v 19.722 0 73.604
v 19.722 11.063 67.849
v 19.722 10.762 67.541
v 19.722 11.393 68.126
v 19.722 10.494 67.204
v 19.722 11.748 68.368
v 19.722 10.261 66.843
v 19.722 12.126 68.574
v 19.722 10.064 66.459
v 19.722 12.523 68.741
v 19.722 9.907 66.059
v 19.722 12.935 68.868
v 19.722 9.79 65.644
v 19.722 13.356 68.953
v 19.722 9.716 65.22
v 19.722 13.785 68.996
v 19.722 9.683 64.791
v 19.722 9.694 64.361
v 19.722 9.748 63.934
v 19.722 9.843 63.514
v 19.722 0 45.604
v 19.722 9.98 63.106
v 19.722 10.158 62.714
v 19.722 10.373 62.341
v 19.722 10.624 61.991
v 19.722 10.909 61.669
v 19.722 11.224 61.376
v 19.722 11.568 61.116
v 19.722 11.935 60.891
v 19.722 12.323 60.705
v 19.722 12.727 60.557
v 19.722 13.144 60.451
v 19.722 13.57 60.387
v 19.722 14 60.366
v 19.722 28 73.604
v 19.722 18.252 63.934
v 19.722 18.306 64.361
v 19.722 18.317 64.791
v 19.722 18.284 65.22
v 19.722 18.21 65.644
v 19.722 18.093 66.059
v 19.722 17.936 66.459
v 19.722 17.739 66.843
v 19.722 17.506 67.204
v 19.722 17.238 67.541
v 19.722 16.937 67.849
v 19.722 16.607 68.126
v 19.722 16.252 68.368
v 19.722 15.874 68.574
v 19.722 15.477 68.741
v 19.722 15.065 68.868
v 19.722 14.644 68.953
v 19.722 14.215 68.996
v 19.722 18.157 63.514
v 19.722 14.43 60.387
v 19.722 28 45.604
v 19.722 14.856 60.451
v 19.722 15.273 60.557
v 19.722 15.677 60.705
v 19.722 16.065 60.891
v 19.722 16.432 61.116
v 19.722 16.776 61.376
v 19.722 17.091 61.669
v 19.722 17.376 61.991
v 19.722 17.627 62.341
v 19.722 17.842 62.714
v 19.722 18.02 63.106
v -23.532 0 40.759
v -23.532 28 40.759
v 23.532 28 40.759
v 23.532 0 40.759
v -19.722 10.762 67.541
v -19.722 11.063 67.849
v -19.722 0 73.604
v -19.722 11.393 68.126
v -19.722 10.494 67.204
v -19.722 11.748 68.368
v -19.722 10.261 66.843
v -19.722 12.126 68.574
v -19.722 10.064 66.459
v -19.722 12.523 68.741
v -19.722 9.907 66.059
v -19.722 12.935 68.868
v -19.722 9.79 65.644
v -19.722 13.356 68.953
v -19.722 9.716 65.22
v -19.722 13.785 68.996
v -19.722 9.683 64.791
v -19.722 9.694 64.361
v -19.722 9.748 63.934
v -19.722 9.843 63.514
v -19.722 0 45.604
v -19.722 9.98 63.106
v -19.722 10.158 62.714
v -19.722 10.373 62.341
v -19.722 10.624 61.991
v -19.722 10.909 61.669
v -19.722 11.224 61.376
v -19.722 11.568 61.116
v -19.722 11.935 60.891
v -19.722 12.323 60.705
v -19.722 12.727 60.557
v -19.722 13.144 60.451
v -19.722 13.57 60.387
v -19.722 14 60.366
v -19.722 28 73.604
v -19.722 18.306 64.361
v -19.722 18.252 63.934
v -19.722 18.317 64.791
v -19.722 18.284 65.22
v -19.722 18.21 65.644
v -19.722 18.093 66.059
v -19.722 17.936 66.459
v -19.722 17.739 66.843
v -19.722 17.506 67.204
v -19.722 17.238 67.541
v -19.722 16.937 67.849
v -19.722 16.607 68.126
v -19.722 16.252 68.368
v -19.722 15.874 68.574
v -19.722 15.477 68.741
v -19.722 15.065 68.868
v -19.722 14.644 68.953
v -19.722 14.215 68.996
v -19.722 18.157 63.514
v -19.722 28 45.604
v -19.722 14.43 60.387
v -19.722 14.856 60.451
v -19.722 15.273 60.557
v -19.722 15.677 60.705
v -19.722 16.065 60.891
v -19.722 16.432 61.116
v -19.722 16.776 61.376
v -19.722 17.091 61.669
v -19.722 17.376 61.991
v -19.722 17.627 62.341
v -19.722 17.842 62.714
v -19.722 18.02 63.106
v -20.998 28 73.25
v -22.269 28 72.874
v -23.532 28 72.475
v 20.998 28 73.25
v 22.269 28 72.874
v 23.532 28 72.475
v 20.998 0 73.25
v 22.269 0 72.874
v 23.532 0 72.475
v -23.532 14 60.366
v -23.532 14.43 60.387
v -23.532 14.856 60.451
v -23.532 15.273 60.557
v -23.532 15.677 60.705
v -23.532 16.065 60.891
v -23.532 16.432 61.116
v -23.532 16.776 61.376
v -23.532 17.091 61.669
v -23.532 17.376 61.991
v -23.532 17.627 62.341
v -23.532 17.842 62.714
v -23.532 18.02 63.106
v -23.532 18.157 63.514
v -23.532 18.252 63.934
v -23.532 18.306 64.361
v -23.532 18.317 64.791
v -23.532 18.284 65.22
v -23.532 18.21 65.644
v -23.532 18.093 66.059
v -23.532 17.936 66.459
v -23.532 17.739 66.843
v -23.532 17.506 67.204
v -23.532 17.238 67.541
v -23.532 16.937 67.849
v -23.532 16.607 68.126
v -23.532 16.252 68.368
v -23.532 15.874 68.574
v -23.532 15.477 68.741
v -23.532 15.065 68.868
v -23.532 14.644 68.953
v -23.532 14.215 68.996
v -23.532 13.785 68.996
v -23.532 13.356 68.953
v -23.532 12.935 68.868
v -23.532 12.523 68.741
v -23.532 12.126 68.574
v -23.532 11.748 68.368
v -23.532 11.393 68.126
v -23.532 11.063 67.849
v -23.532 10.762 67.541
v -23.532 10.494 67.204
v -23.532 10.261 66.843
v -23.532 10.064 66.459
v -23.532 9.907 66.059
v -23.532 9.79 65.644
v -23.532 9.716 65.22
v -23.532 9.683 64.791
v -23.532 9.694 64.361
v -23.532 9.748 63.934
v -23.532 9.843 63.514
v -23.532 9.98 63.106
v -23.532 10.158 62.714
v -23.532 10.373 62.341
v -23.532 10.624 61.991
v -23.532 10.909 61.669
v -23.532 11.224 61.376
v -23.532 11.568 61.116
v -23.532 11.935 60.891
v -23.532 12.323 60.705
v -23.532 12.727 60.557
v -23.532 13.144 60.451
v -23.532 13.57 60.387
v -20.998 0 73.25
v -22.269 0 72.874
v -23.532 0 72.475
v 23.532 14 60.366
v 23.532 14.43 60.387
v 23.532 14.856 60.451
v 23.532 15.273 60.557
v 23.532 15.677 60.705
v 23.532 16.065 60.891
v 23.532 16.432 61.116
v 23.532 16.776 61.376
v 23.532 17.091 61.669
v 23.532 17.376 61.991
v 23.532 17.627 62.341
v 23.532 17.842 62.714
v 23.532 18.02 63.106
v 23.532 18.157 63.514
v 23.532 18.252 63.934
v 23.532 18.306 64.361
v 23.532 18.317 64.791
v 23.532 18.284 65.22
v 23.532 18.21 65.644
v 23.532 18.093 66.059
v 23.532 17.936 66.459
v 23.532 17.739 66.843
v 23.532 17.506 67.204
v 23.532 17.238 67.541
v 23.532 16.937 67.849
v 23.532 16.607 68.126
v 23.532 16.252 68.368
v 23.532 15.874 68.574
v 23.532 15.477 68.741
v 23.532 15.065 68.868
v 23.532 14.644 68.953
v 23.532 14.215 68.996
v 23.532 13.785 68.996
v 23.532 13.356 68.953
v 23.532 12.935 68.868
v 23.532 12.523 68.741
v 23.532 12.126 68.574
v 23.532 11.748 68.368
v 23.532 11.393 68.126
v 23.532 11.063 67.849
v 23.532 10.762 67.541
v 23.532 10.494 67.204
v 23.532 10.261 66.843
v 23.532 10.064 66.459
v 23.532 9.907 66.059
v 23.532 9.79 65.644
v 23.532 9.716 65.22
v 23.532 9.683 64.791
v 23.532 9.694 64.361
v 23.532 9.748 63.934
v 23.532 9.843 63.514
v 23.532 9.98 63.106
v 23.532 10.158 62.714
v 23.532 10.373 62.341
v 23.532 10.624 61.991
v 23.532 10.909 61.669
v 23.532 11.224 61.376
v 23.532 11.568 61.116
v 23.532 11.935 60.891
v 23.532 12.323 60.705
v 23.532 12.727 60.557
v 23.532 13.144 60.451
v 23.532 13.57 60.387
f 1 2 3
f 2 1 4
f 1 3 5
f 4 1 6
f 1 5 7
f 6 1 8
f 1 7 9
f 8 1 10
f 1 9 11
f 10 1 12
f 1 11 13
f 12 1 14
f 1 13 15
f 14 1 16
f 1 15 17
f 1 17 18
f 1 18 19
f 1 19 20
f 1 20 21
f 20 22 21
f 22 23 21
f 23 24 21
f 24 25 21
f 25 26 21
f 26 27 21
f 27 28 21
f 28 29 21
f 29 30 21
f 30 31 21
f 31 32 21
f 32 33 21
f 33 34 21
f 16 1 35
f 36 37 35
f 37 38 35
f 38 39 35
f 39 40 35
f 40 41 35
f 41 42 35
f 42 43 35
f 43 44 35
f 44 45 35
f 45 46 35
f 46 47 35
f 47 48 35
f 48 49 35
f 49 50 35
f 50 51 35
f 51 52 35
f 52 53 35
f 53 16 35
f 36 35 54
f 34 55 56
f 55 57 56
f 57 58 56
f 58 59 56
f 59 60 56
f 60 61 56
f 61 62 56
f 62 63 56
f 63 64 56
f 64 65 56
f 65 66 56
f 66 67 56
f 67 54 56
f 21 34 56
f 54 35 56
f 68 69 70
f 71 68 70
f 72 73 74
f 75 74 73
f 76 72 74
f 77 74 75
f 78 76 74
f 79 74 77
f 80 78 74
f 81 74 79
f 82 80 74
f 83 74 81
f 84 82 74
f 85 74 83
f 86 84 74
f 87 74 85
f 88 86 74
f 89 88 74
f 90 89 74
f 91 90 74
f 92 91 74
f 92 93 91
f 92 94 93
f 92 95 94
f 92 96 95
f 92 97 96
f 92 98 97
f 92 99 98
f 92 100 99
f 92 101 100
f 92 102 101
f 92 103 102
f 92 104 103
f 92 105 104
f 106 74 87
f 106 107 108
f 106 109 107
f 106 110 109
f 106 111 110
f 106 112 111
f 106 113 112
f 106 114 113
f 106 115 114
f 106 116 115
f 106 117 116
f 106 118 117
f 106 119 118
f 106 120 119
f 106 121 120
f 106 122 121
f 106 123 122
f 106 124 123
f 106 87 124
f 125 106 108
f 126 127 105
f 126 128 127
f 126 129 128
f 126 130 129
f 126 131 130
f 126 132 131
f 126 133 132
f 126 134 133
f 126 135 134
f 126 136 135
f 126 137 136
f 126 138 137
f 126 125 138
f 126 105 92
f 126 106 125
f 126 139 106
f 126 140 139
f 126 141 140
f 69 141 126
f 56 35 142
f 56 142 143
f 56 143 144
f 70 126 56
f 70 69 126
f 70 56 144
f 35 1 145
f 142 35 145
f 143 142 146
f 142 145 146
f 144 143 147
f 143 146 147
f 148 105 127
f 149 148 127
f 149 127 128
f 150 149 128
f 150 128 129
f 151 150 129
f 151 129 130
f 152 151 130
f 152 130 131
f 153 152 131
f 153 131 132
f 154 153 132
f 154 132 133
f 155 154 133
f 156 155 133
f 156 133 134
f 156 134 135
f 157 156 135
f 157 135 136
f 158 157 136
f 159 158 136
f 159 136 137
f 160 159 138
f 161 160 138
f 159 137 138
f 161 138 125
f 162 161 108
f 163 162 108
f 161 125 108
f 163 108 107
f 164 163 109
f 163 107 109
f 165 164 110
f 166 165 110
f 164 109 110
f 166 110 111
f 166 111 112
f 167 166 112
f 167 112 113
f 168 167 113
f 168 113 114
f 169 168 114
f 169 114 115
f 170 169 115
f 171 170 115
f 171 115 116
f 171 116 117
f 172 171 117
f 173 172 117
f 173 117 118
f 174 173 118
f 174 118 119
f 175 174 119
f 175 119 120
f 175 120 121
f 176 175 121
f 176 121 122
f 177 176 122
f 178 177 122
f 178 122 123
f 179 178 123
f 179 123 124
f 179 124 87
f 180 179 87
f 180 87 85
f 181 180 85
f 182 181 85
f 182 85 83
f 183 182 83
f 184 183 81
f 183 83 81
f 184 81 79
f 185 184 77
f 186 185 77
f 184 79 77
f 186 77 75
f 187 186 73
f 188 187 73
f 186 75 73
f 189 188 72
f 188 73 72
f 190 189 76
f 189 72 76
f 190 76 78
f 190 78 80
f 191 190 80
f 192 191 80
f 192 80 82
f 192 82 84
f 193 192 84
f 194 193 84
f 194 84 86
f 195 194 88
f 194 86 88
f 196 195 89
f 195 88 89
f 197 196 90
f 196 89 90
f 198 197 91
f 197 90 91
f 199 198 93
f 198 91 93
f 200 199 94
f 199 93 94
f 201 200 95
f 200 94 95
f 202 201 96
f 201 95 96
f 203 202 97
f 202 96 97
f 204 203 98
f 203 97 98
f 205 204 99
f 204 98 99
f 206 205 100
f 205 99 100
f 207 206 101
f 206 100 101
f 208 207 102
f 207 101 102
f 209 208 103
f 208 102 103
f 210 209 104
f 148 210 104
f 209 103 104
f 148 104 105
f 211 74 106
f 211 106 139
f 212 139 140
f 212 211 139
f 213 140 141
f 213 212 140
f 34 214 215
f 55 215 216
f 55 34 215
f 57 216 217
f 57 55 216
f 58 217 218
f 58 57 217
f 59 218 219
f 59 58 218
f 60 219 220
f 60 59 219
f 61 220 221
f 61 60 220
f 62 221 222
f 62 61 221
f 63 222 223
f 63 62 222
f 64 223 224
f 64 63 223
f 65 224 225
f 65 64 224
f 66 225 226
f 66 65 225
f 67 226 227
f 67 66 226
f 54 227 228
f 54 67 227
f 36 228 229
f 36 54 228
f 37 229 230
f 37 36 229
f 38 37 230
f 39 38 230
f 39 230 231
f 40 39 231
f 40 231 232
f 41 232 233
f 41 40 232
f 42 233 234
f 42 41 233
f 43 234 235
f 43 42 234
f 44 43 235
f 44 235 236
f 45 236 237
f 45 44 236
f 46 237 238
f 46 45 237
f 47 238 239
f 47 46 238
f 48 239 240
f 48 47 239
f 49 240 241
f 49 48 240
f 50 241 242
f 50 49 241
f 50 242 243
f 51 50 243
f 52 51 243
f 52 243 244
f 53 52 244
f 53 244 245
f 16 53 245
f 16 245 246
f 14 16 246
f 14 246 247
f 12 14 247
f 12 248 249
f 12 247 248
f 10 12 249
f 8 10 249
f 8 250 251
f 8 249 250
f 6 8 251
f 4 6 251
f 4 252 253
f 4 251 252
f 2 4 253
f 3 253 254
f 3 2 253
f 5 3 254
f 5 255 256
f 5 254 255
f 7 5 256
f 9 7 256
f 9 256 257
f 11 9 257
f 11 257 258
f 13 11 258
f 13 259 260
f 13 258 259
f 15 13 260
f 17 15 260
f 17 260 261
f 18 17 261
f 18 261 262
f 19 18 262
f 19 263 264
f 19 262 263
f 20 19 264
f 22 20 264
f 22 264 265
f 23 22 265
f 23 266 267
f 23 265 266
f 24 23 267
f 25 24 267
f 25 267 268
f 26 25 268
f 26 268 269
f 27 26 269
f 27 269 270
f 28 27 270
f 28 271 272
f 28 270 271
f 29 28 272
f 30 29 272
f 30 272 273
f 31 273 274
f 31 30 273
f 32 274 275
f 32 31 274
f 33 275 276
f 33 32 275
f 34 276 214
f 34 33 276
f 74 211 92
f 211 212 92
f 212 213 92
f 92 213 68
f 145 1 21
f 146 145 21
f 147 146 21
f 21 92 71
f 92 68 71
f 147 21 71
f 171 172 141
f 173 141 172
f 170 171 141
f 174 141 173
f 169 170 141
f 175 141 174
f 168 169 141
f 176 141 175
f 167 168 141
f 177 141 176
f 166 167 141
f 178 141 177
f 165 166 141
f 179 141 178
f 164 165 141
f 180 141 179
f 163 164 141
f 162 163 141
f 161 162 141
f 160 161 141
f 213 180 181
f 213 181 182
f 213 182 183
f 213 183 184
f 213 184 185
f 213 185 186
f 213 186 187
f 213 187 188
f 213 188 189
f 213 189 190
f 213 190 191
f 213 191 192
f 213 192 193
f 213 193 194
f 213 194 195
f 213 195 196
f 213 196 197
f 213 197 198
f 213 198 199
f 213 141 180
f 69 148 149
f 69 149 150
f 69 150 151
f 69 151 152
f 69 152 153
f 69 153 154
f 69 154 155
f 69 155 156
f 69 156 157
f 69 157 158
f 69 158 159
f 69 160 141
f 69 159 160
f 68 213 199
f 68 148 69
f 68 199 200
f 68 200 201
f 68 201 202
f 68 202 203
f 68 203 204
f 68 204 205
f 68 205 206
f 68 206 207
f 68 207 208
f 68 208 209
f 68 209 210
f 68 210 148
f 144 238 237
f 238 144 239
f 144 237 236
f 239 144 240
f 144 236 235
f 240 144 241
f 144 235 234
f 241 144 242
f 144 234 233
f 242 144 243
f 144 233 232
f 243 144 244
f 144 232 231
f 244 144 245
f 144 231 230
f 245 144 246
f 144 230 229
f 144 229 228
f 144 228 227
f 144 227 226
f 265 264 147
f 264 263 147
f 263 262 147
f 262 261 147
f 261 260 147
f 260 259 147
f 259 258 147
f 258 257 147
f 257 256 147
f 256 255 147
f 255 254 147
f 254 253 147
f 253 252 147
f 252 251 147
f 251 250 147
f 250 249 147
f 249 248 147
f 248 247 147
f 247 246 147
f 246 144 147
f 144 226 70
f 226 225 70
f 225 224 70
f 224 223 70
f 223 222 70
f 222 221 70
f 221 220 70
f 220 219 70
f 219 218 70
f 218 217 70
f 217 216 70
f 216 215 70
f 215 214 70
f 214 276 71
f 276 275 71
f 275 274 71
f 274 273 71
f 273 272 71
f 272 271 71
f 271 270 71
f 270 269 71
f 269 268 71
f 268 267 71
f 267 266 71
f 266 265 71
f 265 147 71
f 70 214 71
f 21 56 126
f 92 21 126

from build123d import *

# Parameters (mm, degrees)
BOSS_EXTRUDE1_DEPTH = 28
CUT_EXTRUDE1_DEPTH  = 90.677477663
SKETCH5_R           = 6.35
CUT_EXTRUDE2_DEPTH  = 4.572
SKETCH8_R           = 6.35
SKETCH8_R_2         = 4.318
BOSS_EXTRUDE4_DEPTH = 6.858
CUT_EXTRUDE6_START  = -2.54
CUT_EXTRUDE6_DEPTH  = 91.021953984
SKETCH14_W          = 51.838761269
SKETCH14_H          = 46.114624518
CUT_EXTRUDE7_DEPTH  = 83.190253836


with BuildPart() as part:
    # Sketch2 → Boss-Extrude1 (new body)
    with BuildSketch(Plane(origin=(0, 0, 0), x_dir=(1, 0, 0), z_dir=(0, 1, 0))):
        with BuildLine():
            Line((-38.1, -65.991135768), (0, 0))
            Line((0, 0), (0, -76.2))
            ThreePointArc((0, -76.2), (-19.722011237, -73.603547963), (-38.1, -65.991135768))
        make_face()
    boss_extrude1 = extrude(amount=BOSS_EXTRUDE1_DEPTH)

    # Sketch4 → Cut-Extrude1 (cut, symmetric)
    with BuildSketch(Plane(origin=(0, 28, 0), x_dir=(1, 0, 0), z_dir=(0, 1, 0))):
        Polygon((-19.722011237, -73.603547963), (-19.722011237, -45.603553163), (19.722011237, -45.603553163), (19.722011237, -73.603547963), (19.722011237, -89.083413221), (-19.722011237, -89.083413221), align=None)
    cut_extrude1 = extrude(amount=CUT_EXTRUDE1_DEPTH, both=True, mode=Mode.SUBTRACT)

    # Sketch5 → Cut-Extrude2 (cut)
    with BuildSketch(Plane(origin=(-19.722011237, 0, 0), x_dir=(0, 0, -1), z_dir=(1, 0, 0))):
        with Locations((-64.683550563, 14)):
            Circle(SKETCH5_R)
    cut_extrude2 = extrude(amount=-CUT_EXTRUDE2_DEPTH, mode=Mode.SUBTRACT)

    # Sketch8 → Boss-Extrude4 (add)
    with BuildSketch(Plane(origin=(-19.722011237, 0, 0), x_dir=(0, 0, -1), z_dir=(1, 0, 0))):
        with Locations((-64.683550563, 14)):
            Circle(SKETCH8_R)
        with Locations((-64.683550563, 14)):
            Circle(SKETCH8_R_2, mode=Mode.SUBTRACT)
    boss_extrude4 = extrude(amount=-BOSS_EXTRUDE4_DEPTH)

    # Sketch13 → Cut-Extrude6 (cut)
    with BuildSketch(Plane(origin=(0, 0, 0), x_dir=(1, 0, 0), z_dir=(0, 1, 0)).offset(CUT_EXTRUDE6_START)):
        Polygon((-23.532011237, -79.497992122), (-59.753612954, -79.497992122), (-59.753612954, -51.700018712), (-33.00752403, -46.22932884), (-23.532011237, -36.276651464), (-23.532011237, -51.700018712), align=None)
        with BuildLine():
            Line((-6.646719096, -17.852832416), (-17.283715983, -36.276651464))
            Line((-17.283715983, -36.276651464), (-10.73360519, -40.058359694))
            Line((-10.73360519, -40.058359694), (-3.170188732, -40.058359694))
            Line((-3.170188732, -40.058359694), (-3.170188732, -18.78436593))
            ThreePointArc((-3.170188732, -18.78436593), (-4.930502865, -18.400886976), (-6.646719096, -17.852832416))
        make_face()
    cut_extrude6 = extrude(amount=CUT_EXTRUDE6_DEPTH, mode=Mode.SUBTRACT)

    # Sketch14 → Cut-Extrude7 (cut, symmetric)
    with BuildSketch(Plane(origin=(0, 28, 0), x_dir=(1, 0, 0), z_dir=(0, 1, 0))):
        with Locations((2.387369397, -17.701326807)):
            Rectangle(SKETCH14_W, SKETCH14_H)
    cut_extrude7 = extrude(amount=CUT_EXTRUDE7_DEPTH, both=True, mode=Mode.SUBTRACT)

    # Mirror2: Boss-Extrude1, Cut-Extrude1, Cut-Extrude2, Boss-Extrude4, Cut-Extrude6, Cut-Extrude7 across plane
    add(boss_extrude1.mirror(Plane(origin=(0, 28, 0), x_dir=(0, 0, 1), z_dir=(-1, 0, 0))))
    add(cut_extrude1.mirror(Plane(origin=(0, 28, 0), x_dir=(0, 0, 1), z_dir=(-1, 0, 0))), mode=Mode.SUBTRACT)
    add(cut_extrude2.mirror(Plane(origin=(0, 28, 0), x_dir=(0, 0, 1), z_dir=(-1, 0, 0))), mode=Mode.SUBTRACT)
    add(boss_extrude4.mirror(Plane(origin=(0, 28, 0), x_dir=(0, 0, 1), z_dir=(-1, 0, 0))))
    add(cut_extrude6.mirror(Plane(origin=(0, 28, 0), x_dir=(0, 0, 1), z_dir=(-1, 0, 0))), mode=Mode.SUBTRACT)
    add(cut_extrude7.mirror(Plane(origin=(0, 28, 0), x_dir=(0, 0, 1), z_dir=(-1, 0, 0))), mode=Mode.SUBTRACT)


solid = part.part
